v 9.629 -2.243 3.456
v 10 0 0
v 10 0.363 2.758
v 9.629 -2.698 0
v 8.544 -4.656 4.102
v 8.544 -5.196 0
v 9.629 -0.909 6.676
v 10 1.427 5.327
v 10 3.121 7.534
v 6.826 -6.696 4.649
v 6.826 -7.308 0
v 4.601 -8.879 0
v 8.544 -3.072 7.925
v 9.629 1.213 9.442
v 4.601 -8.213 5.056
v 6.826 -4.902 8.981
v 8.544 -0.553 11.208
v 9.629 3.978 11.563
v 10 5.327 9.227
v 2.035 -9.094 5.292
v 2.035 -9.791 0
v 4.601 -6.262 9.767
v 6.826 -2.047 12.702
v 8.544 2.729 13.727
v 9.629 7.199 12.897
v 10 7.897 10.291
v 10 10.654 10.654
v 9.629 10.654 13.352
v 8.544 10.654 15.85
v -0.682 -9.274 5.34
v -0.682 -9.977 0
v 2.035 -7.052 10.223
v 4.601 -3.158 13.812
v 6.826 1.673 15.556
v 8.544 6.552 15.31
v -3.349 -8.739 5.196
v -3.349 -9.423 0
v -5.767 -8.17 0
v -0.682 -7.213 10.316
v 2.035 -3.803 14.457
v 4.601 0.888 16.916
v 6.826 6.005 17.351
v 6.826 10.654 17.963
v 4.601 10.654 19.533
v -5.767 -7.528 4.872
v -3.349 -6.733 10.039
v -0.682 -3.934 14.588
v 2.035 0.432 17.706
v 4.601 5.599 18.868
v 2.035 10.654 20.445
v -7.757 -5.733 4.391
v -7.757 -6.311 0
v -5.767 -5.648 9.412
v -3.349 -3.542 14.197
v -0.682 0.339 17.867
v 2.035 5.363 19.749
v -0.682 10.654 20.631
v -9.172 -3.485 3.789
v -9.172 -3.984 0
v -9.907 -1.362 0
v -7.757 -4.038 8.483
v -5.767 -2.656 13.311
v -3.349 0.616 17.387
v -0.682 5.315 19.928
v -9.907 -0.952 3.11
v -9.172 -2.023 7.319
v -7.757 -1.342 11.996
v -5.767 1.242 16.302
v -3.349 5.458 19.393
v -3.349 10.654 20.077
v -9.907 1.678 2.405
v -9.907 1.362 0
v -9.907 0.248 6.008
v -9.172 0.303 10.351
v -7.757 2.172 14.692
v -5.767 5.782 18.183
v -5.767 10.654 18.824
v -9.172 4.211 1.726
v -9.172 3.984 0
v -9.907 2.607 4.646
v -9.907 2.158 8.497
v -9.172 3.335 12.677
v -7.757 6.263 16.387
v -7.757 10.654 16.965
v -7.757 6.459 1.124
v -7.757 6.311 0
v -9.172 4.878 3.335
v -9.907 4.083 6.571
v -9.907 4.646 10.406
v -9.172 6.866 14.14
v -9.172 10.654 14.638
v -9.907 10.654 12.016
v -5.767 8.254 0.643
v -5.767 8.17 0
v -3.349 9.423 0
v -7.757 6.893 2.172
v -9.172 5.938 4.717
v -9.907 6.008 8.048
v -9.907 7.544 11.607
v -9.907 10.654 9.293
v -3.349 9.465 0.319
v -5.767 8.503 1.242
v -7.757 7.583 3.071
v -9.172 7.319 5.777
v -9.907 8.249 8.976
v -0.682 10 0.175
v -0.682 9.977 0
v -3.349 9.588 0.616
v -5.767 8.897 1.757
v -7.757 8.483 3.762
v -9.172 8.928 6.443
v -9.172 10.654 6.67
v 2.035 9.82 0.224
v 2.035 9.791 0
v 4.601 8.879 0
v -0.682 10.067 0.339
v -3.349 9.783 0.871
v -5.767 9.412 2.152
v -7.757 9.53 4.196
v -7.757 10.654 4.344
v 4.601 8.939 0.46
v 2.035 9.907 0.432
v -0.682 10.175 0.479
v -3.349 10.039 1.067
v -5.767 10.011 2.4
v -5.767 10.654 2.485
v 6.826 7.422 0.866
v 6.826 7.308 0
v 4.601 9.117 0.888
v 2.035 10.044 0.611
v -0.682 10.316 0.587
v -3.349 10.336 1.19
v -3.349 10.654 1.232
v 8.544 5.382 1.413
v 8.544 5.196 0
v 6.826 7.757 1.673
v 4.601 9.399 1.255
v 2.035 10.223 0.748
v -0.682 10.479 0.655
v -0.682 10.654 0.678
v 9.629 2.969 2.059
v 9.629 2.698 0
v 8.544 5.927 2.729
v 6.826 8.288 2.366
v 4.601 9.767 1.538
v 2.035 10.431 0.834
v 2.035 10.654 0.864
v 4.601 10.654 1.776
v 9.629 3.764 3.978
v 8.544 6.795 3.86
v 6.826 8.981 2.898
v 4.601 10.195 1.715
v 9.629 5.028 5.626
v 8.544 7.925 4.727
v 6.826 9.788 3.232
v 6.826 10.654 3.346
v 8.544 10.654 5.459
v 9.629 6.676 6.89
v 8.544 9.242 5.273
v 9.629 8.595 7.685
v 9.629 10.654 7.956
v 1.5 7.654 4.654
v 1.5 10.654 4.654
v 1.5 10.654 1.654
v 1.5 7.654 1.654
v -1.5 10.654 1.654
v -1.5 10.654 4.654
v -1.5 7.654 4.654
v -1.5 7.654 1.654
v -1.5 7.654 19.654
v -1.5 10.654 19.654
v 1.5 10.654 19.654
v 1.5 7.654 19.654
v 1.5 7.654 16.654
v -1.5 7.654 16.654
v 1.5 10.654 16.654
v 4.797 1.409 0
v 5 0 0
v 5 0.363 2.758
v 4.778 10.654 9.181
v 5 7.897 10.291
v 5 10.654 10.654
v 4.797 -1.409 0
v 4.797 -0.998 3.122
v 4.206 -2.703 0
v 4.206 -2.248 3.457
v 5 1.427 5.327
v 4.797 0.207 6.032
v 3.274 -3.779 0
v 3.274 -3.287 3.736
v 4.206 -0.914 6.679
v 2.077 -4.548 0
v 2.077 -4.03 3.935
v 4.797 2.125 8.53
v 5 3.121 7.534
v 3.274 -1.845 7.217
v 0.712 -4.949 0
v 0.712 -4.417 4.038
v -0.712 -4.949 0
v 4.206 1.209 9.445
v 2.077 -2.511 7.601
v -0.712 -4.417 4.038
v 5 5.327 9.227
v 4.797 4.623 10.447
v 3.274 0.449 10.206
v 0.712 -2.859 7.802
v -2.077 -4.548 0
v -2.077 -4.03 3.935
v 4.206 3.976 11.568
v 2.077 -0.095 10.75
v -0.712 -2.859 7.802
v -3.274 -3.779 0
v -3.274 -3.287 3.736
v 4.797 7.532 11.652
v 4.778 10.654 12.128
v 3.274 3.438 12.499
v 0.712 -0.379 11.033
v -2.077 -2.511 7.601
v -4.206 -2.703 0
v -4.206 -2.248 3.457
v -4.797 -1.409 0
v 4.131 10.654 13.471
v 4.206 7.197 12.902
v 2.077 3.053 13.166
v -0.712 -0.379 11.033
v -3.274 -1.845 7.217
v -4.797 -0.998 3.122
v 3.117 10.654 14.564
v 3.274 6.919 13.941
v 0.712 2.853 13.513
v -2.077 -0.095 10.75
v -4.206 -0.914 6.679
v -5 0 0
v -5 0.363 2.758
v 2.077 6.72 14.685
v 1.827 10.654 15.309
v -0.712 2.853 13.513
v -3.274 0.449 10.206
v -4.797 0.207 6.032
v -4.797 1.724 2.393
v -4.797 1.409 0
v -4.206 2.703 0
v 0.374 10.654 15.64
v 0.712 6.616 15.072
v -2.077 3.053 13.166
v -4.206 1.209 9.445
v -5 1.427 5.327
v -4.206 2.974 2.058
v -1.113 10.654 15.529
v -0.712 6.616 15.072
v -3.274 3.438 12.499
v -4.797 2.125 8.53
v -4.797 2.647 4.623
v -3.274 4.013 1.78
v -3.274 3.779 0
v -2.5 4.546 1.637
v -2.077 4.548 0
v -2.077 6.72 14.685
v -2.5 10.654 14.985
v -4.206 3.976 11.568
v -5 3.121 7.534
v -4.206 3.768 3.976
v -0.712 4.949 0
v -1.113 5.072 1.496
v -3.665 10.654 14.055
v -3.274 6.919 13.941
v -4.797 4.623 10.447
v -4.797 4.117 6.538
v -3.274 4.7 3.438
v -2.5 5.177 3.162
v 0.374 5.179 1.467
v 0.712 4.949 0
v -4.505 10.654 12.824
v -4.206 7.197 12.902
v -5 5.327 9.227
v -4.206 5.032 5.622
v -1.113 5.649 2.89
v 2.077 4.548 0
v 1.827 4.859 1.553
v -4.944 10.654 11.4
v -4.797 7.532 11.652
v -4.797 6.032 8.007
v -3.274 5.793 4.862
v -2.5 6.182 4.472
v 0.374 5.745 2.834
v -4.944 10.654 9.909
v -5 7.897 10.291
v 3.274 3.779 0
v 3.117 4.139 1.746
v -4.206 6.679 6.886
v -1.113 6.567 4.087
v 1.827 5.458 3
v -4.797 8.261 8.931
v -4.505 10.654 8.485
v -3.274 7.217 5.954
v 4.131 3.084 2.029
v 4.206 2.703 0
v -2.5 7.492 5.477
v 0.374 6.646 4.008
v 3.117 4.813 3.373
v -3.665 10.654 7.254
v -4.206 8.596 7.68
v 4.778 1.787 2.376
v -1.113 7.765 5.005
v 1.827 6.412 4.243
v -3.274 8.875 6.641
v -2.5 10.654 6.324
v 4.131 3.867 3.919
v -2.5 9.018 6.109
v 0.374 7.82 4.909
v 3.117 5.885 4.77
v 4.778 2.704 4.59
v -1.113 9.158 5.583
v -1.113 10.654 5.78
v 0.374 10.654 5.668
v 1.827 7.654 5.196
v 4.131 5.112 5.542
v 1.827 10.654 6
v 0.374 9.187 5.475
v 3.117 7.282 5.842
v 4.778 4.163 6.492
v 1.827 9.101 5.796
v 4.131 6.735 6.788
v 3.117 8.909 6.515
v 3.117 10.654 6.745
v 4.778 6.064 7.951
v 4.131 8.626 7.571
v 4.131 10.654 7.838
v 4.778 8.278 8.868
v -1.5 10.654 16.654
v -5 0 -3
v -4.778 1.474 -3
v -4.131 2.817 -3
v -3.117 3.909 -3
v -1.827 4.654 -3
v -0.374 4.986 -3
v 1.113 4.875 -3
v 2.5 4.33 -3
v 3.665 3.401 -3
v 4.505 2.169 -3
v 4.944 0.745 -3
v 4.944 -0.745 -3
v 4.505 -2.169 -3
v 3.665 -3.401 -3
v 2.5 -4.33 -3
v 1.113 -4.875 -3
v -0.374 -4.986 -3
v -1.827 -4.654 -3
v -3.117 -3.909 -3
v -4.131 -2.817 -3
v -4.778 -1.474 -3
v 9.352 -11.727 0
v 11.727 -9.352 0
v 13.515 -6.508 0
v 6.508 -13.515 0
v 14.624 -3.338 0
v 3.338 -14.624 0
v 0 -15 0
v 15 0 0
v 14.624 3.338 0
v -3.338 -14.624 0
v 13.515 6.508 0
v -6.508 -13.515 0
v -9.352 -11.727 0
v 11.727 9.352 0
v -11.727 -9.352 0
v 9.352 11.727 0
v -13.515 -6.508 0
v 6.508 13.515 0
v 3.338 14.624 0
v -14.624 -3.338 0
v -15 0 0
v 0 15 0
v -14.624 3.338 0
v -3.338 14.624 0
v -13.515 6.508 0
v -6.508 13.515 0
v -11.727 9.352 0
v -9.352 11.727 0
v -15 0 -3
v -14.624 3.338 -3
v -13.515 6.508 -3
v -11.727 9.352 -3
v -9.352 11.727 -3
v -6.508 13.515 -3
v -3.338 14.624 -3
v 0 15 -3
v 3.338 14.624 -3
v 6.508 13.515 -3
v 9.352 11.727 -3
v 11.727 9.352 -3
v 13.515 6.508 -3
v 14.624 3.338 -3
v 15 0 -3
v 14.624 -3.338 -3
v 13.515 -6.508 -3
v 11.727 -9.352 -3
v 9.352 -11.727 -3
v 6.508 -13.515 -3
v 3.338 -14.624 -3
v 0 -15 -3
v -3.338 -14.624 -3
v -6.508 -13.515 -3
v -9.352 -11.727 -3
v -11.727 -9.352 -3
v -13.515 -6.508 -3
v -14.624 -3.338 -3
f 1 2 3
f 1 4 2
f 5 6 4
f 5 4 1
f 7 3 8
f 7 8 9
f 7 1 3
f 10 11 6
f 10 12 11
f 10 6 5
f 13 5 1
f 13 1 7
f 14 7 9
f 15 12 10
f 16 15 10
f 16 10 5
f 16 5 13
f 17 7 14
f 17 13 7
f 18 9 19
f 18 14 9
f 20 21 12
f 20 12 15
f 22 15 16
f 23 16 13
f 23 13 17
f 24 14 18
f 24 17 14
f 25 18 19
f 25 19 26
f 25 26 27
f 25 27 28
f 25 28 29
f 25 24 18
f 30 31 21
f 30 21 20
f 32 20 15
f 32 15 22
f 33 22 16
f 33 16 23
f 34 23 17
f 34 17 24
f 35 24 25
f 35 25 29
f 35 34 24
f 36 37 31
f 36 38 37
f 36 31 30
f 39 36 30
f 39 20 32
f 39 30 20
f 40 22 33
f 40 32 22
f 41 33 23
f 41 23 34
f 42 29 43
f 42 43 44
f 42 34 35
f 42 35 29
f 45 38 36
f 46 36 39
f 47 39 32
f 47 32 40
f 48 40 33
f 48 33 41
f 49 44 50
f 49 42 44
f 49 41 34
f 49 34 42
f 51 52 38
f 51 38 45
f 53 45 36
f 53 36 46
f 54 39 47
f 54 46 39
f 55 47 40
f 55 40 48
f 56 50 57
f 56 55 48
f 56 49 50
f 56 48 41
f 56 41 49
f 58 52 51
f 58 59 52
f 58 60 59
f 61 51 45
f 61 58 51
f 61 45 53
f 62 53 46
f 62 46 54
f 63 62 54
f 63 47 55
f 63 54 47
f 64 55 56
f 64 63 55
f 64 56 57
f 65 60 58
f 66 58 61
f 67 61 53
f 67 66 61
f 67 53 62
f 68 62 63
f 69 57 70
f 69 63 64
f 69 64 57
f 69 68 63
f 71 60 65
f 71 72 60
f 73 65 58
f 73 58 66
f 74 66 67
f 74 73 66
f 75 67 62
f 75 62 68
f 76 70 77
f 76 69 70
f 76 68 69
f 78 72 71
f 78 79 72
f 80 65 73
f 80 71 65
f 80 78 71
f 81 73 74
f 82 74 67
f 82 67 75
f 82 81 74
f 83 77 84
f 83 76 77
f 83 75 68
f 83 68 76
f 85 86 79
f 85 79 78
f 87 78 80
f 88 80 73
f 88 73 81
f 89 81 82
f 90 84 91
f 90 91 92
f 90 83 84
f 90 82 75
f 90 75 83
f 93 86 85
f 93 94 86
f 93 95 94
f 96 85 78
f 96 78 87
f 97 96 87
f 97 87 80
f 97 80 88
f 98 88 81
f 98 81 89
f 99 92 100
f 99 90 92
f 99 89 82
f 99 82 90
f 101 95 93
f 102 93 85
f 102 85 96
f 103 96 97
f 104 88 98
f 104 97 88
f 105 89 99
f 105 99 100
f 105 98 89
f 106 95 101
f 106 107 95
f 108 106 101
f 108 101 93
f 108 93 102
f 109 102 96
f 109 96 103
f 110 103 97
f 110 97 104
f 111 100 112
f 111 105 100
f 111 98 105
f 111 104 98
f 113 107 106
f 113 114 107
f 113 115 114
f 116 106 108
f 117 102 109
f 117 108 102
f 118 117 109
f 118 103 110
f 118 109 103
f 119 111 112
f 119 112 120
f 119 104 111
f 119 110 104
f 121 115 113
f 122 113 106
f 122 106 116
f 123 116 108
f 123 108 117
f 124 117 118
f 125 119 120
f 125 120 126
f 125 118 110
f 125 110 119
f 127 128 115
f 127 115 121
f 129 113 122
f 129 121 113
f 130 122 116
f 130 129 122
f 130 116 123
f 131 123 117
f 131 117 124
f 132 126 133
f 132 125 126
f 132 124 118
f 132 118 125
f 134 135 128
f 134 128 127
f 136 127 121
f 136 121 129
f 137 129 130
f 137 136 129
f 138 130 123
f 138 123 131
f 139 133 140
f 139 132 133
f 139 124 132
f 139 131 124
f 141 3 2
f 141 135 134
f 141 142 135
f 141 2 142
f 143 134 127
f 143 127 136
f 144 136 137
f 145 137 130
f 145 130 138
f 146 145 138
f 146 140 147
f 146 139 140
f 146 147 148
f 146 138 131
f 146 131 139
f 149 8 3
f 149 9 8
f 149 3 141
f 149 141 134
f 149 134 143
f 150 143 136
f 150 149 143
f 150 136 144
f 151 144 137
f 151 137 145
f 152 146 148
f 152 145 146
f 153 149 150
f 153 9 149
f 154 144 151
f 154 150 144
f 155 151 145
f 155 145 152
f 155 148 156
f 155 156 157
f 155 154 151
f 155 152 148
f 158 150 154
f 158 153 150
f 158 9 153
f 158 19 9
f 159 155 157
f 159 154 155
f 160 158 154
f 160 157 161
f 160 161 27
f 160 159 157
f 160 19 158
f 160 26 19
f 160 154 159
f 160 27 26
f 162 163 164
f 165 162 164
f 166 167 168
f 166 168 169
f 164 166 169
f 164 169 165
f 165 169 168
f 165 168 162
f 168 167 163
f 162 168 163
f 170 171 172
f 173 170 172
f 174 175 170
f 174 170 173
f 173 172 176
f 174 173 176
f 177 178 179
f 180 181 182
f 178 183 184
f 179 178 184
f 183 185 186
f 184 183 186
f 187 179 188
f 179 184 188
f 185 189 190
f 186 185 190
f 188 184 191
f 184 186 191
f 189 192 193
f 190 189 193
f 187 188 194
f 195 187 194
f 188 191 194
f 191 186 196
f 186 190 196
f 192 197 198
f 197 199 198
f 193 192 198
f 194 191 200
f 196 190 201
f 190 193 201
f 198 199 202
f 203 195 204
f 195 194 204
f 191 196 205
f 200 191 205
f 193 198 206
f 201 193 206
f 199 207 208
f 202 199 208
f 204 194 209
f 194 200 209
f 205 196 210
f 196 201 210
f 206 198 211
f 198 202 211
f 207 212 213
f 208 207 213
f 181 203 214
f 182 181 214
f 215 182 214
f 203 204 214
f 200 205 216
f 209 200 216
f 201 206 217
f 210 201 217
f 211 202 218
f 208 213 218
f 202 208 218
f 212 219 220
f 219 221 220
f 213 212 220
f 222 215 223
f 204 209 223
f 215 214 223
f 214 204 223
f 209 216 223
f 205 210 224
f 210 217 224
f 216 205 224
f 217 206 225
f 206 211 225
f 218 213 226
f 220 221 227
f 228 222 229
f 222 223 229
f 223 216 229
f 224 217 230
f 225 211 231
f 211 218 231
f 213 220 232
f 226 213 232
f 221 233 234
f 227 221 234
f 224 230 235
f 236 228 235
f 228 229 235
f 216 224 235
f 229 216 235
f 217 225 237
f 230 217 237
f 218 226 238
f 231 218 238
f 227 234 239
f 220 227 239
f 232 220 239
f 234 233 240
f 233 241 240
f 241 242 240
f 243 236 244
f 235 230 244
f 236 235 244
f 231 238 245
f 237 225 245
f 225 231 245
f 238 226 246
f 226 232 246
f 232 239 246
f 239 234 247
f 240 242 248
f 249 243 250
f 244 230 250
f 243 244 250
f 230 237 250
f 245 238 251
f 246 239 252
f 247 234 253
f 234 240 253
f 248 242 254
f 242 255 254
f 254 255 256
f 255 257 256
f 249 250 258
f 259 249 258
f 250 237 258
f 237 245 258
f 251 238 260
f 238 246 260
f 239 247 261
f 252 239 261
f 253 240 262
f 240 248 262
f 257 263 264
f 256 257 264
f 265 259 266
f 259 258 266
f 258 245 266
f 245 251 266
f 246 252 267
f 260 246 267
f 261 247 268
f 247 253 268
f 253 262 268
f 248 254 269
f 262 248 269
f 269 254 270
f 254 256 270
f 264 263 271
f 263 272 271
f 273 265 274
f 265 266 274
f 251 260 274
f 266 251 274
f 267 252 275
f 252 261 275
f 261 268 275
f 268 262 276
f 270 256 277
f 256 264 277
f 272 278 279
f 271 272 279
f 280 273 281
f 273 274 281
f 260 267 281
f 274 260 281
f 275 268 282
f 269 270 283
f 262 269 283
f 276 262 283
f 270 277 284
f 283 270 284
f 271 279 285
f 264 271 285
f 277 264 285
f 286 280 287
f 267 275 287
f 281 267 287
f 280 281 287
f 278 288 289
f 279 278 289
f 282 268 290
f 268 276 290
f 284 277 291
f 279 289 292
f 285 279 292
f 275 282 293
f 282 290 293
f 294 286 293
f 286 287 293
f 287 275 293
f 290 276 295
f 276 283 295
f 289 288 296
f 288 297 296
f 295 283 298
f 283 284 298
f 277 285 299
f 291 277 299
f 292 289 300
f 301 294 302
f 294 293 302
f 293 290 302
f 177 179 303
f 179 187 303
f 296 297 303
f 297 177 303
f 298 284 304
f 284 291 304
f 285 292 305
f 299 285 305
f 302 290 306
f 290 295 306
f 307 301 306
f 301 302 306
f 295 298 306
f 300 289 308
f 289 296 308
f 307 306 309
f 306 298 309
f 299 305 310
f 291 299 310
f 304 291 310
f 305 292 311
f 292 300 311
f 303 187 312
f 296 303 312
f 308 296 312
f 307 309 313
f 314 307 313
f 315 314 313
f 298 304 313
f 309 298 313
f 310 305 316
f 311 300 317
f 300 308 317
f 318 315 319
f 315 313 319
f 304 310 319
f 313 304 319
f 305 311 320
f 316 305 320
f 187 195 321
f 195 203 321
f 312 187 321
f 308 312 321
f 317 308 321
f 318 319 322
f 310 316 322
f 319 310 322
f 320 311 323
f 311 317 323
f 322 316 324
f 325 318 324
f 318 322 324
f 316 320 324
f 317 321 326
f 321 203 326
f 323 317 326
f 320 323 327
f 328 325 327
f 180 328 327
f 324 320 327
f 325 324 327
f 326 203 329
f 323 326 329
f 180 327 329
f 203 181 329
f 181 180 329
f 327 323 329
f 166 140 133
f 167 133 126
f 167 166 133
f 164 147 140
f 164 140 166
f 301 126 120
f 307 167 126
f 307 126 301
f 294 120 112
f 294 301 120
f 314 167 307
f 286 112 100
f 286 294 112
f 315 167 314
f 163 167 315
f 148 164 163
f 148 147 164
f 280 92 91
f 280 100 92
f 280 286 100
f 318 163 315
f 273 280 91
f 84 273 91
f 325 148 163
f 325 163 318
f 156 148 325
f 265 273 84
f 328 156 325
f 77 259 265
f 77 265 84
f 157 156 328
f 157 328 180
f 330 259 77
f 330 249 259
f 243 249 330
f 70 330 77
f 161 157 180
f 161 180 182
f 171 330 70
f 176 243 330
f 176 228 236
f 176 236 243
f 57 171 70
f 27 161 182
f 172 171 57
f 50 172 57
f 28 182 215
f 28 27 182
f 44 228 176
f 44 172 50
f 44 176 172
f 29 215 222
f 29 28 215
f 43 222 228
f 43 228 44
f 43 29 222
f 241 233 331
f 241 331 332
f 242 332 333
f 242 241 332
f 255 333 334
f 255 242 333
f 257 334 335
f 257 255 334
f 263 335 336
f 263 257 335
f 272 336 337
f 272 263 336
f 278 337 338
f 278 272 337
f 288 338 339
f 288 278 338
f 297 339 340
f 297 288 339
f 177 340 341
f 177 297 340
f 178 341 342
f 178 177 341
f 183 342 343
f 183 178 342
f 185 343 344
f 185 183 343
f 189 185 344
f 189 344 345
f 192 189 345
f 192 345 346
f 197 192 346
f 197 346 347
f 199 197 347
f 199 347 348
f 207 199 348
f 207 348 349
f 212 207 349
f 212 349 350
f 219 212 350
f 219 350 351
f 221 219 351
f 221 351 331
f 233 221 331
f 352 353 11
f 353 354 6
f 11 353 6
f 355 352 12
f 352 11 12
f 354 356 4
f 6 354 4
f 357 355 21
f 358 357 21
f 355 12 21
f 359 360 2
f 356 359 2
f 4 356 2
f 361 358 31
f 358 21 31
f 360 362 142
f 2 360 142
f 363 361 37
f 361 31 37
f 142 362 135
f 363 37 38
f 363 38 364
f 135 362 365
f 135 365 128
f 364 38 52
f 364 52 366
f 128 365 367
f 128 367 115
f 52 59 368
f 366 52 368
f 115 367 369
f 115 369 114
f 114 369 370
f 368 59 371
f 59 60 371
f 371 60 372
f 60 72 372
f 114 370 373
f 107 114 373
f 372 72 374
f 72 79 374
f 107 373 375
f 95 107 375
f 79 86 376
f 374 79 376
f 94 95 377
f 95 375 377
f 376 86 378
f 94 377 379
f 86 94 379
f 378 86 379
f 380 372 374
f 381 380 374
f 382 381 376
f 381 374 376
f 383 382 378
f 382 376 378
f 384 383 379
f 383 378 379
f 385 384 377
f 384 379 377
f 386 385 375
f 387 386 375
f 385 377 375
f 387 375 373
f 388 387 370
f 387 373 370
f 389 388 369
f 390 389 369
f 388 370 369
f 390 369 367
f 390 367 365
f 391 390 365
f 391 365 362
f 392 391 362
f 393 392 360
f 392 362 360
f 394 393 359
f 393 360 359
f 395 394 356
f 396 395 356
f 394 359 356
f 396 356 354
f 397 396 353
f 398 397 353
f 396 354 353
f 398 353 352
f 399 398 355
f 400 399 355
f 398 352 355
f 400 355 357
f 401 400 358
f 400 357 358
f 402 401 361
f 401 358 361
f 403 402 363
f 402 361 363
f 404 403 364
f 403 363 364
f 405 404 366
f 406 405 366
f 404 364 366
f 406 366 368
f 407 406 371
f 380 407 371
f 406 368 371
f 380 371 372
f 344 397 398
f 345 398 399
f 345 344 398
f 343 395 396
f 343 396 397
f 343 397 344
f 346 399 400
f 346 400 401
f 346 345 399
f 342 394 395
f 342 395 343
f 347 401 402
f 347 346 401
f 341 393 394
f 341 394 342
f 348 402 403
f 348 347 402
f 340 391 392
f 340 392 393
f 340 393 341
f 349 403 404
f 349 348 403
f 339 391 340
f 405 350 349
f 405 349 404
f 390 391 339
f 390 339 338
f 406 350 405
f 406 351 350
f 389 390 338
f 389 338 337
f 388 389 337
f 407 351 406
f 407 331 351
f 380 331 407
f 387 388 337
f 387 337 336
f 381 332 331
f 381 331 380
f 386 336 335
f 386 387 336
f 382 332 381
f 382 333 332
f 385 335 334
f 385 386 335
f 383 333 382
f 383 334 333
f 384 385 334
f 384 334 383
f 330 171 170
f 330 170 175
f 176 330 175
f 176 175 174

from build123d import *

# Parameters (mm, degrees)
SKETCH1_R           = 10
SKETCH1_R_2         = 5
SKETCH4_R           = 15
SKETCH4_R_2         = 5
BOSS_EXTRUDE1_DEPTH = 3
SKETCH5_W           = 3
SKETCH5_H           = 3
CUT_EXTRUDE1_DEPTH  = 3


with BuildPart() as part:
    # Sweep1: sweep along a path in Sketch3
    with BuildLine(Plane(origin=(0, 0, 0), x_dir=(0, 0, -1), z_dir=(1, 0, 0))) as sweep1_path:
        ThreePointArc((0, 0), (-7.533795299, 3.120600189), (-10.654395489, 10.654395489))
    # Sketch1 → Sweep1 (sweep)
    with BuildSketch(Plane.XY):
        Circle(SKETCH1_R)
        Circle(SKETCH1_R_2, mode=Mode.SUBTRACT)
    sweep(path=sweep1_path.line)

    # Sketch4 → Boss-Extrude1 (add)
    with BuildSketch(Plane(origin=(0, 0, 0), x_dir=(-1, 0, 0), z_dir=(0, 0, -1))):
        Circle(SKETCH4_R)
        Circle(SKETCH4_R_2, mode=Mode.SUBTRACT)
    extrude(amount=BOSS_EXTRUDE1_DEPTH)

    # Sketch5 → Cut-Extrude1 (cut)
    with BuildSketch(Plane(origin=(0, 10.654395489, 0), x_dir=(1, 0, 0), z_dir=(0, 1, 0))):
        with Locations((0, -3.154395489)):
            Rectangle(SKETCH5_W, SKETCH5_H)
        with Locations((0, -18.154395489)):
            Rectangle(SKETCH5_W, SKETCH5_H)
    extrude(amount=-CUT_EXTRUDE1_DEPTH, mode=Mode.SUBTRACT)


solid = part.part
